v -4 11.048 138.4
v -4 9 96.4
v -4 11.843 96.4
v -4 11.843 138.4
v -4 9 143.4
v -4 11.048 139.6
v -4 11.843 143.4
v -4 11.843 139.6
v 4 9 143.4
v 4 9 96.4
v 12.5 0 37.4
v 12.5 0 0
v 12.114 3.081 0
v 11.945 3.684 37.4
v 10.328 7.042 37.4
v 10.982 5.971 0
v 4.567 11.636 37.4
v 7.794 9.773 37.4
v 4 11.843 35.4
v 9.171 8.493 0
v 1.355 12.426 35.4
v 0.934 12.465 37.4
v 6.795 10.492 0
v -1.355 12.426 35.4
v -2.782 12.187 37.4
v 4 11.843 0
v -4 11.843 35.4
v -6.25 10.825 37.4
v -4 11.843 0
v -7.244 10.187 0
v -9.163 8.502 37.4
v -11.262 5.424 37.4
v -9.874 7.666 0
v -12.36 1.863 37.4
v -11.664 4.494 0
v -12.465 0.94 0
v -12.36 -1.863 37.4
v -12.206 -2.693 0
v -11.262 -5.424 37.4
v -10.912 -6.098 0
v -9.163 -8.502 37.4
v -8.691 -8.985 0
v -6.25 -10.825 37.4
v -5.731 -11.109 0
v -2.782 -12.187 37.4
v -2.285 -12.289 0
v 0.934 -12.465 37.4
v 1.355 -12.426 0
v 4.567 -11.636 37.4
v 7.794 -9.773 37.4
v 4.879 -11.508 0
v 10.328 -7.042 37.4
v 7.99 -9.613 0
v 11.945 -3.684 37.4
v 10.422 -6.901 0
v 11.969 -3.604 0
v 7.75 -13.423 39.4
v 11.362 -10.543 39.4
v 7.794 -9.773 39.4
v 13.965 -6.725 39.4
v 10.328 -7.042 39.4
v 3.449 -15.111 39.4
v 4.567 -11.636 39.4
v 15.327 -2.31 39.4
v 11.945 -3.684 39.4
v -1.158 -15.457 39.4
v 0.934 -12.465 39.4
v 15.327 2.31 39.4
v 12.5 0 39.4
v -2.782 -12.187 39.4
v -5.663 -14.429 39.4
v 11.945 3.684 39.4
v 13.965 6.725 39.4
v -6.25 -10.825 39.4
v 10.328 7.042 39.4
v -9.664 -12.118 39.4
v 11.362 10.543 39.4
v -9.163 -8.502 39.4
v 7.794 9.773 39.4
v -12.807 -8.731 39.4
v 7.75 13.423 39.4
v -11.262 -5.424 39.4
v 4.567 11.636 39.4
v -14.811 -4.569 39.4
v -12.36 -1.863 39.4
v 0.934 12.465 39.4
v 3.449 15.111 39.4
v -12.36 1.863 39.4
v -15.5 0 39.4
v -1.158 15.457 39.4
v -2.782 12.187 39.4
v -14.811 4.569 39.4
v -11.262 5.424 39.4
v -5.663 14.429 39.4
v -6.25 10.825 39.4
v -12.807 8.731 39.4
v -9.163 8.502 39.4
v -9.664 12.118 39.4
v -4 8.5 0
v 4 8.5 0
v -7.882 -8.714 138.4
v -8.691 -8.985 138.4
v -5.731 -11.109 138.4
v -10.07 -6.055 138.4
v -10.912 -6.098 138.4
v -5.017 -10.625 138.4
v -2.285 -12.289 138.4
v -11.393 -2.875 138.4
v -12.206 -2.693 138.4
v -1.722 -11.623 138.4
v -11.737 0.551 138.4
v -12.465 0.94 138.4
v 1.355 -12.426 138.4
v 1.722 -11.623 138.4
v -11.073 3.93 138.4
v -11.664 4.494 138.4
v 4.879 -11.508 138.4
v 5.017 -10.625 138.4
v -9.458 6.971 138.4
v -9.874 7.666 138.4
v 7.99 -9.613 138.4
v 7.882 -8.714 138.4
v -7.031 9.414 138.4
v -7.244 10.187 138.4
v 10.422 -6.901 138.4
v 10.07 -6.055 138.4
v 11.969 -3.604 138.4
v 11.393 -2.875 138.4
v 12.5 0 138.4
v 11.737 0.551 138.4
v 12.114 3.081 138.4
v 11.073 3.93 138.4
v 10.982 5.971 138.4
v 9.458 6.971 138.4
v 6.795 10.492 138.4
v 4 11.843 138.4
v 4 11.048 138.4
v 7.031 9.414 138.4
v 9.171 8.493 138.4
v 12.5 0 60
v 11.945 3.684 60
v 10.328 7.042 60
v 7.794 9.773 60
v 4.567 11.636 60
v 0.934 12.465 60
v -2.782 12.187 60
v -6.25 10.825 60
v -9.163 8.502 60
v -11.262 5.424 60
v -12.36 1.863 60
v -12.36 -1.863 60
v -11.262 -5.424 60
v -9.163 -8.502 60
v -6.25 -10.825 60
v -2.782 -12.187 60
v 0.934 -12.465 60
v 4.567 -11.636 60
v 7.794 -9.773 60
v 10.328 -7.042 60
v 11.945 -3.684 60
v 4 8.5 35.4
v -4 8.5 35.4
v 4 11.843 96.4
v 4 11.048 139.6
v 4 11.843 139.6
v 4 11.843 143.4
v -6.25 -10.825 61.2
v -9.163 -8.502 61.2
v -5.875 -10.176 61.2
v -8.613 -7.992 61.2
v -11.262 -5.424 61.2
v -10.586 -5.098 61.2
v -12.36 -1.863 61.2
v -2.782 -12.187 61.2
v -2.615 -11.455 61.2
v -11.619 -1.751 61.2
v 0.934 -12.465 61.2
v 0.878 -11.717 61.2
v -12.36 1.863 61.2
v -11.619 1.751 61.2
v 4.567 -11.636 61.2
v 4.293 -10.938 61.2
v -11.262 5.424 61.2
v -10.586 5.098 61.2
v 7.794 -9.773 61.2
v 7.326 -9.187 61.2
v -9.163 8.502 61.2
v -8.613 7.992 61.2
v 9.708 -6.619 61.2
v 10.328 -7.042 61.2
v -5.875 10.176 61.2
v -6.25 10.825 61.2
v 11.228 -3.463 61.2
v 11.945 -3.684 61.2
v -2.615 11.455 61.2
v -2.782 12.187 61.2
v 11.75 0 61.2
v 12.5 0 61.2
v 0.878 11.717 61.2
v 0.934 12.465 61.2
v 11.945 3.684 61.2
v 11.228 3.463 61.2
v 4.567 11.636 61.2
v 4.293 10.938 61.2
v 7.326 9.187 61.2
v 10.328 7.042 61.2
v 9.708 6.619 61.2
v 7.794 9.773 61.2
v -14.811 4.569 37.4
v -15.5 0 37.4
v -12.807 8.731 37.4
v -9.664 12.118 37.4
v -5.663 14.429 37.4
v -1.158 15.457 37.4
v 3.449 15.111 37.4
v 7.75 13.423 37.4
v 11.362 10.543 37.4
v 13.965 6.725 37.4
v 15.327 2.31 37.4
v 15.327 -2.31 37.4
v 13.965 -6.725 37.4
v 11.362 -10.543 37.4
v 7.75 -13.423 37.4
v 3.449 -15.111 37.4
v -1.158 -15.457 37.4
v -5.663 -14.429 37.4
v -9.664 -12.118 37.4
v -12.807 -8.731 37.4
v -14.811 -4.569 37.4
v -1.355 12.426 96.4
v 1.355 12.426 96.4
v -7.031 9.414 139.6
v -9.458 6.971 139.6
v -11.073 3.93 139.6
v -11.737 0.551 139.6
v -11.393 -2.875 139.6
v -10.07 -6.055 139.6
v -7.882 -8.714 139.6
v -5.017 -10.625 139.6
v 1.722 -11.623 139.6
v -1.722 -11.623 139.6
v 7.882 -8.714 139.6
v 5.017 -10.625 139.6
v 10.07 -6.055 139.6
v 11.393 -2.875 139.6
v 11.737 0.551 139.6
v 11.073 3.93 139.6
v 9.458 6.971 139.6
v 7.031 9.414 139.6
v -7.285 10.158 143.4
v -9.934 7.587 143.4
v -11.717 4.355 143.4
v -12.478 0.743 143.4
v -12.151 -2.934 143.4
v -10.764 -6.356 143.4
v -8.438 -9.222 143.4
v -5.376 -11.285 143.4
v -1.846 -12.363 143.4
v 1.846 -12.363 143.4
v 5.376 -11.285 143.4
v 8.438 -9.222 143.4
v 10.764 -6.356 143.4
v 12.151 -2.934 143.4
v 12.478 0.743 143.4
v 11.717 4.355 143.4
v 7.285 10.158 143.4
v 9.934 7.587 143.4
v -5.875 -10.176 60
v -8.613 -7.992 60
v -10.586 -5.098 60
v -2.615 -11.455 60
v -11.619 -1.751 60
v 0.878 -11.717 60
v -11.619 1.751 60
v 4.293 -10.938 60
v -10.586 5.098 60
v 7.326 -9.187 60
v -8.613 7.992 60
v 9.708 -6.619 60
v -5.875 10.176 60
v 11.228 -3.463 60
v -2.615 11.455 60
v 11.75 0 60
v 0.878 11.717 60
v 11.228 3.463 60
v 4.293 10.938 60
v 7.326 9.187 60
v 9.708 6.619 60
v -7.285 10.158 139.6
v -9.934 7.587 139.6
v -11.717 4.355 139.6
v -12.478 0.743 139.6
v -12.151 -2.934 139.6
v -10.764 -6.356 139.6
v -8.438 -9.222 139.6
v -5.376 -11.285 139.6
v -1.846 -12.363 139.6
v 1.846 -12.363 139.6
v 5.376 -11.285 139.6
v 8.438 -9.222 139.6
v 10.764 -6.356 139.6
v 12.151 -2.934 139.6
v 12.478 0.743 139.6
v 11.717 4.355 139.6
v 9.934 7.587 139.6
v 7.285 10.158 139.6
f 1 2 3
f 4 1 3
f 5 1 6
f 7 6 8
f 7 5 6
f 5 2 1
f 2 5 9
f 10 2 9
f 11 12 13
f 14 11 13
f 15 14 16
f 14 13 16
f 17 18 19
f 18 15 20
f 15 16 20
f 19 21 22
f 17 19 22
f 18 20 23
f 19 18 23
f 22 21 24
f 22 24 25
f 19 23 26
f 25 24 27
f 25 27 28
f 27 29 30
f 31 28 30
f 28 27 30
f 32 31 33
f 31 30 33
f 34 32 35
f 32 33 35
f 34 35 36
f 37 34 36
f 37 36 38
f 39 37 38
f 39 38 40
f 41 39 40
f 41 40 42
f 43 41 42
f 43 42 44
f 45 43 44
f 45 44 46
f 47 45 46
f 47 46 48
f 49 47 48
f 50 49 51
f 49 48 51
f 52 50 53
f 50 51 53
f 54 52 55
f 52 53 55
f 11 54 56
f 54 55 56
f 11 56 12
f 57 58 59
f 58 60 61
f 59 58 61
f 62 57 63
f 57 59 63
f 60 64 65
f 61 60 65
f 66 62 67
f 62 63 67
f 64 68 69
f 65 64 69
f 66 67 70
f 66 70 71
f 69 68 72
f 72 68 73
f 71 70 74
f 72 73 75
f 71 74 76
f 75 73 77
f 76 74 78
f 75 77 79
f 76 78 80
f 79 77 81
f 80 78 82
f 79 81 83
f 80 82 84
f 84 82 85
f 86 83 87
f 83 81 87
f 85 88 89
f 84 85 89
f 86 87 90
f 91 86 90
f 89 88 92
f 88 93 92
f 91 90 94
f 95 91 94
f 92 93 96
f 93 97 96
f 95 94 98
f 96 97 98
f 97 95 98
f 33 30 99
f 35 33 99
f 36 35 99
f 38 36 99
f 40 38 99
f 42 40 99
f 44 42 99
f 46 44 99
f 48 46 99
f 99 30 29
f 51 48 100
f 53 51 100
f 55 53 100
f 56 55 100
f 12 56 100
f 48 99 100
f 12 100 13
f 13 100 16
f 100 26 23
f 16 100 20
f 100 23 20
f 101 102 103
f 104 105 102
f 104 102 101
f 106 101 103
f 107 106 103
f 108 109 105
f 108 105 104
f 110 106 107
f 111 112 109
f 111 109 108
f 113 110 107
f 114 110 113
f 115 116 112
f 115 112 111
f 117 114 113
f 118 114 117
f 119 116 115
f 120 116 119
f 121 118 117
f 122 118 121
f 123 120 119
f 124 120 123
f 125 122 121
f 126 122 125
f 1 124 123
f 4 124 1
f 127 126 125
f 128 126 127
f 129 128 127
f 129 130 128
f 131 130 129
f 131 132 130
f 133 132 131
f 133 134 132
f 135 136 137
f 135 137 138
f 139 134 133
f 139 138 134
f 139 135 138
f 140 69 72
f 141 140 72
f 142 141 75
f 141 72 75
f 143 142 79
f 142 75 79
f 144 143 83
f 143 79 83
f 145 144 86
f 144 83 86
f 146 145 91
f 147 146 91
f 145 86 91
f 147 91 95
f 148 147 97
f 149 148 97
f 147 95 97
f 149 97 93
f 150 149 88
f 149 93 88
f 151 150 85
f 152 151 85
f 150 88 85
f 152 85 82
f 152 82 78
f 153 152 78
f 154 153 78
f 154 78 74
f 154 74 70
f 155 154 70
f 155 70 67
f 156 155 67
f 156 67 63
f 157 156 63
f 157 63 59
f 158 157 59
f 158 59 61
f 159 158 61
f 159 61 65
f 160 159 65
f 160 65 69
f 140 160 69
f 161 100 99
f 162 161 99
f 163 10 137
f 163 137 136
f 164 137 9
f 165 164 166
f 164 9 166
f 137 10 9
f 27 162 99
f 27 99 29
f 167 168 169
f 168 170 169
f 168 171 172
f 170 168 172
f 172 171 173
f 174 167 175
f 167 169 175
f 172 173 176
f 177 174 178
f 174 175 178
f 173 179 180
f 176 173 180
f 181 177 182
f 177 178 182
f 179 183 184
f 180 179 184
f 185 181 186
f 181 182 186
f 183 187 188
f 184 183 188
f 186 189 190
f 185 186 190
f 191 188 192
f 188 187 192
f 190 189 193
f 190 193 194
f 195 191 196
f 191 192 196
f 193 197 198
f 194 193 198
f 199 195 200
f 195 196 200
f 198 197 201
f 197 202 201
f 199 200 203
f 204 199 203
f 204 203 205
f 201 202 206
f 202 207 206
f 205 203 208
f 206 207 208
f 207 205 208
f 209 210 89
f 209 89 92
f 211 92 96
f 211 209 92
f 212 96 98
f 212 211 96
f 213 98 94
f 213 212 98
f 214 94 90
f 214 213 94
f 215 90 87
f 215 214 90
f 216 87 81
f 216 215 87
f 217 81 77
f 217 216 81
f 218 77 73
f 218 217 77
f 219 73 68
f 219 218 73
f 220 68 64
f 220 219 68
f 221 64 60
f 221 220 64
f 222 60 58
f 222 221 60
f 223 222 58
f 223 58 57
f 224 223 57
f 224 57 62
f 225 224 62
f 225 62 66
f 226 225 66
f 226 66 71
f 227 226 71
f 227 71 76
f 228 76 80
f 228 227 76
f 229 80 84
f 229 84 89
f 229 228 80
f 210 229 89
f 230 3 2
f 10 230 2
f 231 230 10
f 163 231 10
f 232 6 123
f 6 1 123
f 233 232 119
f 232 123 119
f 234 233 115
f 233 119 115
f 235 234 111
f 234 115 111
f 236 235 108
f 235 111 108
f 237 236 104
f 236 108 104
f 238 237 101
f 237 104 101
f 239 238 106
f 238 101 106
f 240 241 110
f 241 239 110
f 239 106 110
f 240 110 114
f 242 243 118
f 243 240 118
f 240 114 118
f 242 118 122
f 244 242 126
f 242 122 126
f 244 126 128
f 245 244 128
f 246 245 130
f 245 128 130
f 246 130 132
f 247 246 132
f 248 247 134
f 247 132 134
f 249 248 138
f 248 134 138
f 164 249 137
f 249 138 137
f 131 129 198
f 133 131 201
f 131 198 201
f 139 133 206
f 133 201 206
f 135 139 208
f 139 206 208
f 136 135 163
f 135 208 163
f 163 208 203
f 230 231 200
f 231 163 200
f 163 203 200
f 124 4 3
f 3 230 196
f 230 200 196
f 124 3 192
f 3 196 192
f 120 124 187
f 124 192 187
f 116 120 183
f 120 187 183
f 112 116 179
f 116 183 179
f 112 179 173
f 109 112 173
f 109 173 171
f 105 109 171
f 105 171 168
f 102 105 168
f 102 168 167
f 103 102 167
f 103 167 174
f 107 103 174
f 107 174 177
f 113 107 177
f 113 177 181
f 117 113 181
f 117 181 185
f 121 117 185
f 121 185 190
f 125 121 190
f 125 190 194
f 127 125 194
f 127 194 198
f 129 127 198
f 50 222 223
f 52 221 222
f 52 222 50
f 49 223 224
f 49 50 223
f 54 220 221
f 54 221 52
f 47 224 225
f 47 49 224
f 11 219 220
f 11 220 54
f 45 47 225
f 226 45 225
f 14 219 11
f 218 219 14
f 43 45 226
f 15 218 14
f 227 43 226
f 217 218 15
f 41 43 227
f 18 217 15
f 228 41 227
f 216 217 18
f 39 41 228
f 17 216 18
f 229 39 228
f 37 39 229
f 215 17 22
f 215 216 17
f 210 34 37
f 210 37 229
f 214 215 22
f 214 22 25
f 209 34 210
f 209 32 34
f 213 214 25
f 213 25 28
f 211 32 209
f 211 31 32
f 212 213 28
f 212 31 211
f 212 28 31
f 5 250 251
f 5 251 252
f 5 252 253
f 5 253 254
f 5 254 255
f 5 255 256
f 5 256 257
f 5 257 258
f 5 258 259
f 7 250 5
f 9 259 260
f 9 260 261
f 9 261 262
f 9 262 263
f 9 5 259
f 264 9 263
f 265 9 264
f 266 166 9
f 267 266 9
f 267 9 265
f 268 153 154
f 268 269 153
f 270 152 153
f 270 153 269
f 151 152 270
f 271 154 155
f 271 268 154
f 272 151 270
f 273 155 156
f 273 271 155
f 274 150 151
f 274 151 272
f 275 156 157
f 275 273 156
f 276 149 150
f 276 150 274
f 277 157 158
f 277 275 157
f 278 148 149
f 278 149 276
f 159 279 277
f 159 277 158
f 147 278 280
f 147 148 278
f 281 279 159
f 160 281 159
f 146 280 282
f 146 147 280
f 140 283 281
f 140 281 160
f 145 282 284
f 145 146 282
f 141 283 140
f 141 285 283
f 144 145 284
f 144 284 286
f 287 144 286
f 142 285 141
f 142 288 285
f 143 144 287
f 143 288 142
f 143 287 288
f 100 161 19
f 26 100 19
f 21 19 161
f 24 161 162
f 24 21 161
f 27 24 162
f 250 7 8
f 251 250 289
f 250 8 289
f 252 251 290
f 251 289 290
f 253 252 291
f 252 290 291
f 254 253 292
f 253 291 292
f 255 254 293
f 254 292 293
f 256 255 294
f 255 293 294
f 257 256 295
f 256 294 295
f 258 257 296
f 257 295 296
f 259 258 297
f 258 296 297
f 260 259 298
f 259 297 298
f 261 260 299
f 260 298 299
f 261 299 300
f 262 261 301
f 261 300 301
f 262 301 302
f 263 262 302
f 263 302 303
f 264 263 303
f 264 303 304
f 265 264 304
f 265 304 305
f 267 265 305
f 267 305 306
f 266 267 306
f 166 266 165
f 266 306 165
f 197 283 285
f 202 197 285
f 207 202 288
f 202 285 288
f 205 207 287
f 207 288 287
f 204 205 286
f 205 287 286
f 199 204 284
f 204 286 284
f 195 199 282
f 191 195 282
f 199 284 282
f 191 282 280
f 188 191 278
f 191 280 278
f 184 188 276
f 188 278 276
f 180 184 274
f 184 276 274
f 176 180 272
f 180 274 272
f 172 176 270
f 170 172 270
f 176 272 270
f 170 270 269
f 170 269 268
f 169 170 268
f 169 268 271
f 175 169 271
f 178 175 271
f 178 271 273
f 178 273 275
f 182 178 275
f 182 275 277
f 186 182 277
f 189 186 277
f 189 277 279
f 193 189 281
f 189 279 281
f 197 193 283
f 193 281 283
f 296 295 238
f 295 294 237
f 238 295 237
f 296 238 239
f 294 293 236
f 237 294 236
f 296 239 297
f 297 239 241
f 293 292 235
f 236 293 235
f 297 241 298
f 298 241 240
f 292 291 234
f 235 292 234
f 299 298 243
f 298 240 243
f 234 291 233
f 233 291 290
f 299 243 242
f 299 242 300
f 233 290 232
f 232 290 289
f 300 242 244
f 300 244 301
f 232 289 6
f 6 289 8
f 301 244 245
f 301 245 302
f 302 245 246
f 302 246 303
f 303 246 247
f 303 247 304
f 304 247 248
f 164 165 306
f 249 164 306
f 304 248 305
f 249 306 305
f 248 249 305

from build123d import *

# Parameters (mm, degrees)
SKETCH1_R           = 12.5
BOSS_EXTRUDE1_DEPTH = 143.4
SKETCH4_W           = 8
SKETCH4_H           = 8
CUT_EXTRUDE1_DEPTH  = 35.4
SKETCH11_R          = 15.5
BOSS_EXTRUDE4_DEPTH = 2
SKETCH12_R          = 12.5
SKETCH12_R_2        = 11.75
CUT_EXTRUDE2_DEPTH  = 1.2
SKETCH13_W          = 8
SKETCH13_H          = 7
CUT_EXTRUDE3_DEPTH  = 47
SKETCH16_R          = 12.5
SKETCH16_R_2        = 11.75
CUT_EXTRUDE5_DEPTH  = 1.2


with BuildPart() as part:
    # Sketch1 → Boss-Extrude1 (new body)
    with BuildSketch(Plane.XY):
        Circle(SKETCH1_R)
    extrude(amount=BOSS_EXTRUDE1_DEPTH)

    # Sketch4 → Cut-Extrude1 (cut)
    with BuildSketch(Plane(origin=(0, 0, 0), x_dir=(-1, 0, 0), z_dir=(0, 0, -1))):
        with Locations((0, 12.5)):
            Rectangle(SKETCH4_W, SKETCH4_H)
    extrude(amount=-CUT_EXTRUDE1_DEPTH, mode=Mode.SUBTRACT)

    # Sketch11 → Boss-Extrude4 (add)
    with BuildSketch(Plane(origin=(0, 0, 37.4), x_dir=(-1, 0, 0), z_dir=(0, 0, -1))):
        Circle(SKETCH11_R)
    extrude(amount=-BOSS_EXTRUDE4_DEPTH)

    # Sketch12 → Cut-Extrude2 (cut)
    with BuildSketch(Plane.XY.offset(60)):
        Circle(SKETCH12_R)
        Circle(SKETCH12_R_2, mode=Mode.SUBTRACT)
    extrude(amount=CUT_EXTRUDE2_DEPTH, mode=Mode.SUBTRACT)

    # Sketch13 → Cut-Extrude3 (cut)
    with BuildSketch(Plane.XY.offset(143.4)):
        with Locations((0, 12.5)):
            Rectangle(SKETCH13_W, SKETCH13_H)
    extrude(amount=-CUT_EXTRUDE3_DEPTH, mode=Mode.SUBTRACT)

    # Sketch16 → Cut-Extrude5 (cut)
    with BuildSketch(Plane.XY.offset(138.4)):
        Circle(SKETCH16_R)
        Circle(SKETCH16_R_2, mode=Mode.SUBTRACT)
    extrude(amount=CUT_EXTRUDE5_DEPTH, mode=Mode.SUBTRACT)


solid = part.part
